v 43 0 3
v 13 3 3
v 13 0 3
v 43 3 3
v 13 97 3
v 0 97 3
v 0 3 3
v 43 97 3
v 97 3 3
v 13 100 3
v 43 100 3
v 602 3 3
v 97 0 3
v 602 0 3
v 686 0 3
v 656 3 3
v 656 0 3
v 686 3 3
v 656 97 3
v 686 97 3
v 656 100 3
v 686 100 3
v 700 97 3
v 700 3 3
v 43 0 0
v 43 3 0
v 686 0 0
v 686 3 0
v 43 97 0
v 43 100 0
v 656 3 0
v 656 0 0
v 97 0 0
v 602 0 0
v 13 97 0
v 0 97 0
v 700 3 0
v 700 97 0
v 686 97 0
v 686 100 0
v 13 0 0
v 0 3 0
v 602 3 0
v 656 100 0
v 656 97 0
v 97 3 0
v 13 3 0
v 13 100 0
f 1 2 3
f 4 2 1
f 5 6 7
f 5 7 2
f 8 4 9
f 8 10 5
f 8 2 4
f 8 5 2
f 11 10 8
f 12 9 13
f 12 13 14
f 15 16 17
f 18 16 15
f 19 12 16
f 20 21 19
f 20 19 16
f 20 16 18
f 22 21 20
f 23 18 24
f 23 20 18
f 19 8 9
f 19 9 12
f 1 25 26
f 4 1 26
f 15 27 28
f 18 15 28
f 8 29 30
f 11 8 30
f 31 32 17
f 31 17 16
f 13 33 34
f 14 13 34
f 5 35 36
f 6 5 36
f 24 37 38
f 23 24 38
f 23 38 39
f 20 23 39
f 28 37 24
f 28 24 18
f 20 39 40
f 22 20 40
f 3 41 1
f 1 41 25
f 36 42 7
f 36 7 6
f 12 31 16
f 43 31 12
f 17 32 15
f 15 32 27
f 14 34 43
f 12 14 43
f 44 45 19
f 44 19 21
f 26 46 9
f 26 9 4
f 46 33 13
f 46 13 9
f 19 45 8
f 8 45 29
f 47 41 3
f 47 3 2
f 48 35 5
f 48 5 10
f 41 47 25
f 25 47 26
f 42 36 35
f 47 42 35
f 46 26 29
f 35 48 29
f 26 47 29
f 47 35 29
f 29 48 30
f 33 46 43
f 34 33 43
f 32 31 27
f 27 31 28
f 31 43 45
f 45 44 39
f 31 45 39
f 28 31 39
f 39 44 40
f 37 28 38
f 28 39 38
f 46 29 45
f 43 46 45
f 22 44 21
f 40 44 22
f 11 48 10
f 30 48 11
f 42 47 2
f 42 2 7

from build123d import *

# Parameters (mm, degrees)
SKETCH1_W           = 700
SKETCH1_H           = 100
BOSS_EXTRUDE1_DEPTH = 3
SKETCH11_W          = 14
SKETCH11_H          = 3
CUT_EXTRUDE8_DEPTH  = 10
SKETCH12_W          = 54
SKETCH12_H          = 3
CUT_EXTRUDE9_DEPTH  = 10
SKETCH13_W          = 13
SKETCH13_H          = 3
CUT_EXTRUDE10_DEPTH = 10
SKETCH14_W          = 54
SKETCH14_H          = 3
CUT_EXTRUDE11_DEPTH = 10
SKETCH15_W          = 14
SKETCH15_H          = 3
CUT_EXTRUDE12_DEPTH = 10
SKETCH16_W          = 54
SKETCH16_H          = 3
CUT_EXTRUDE13_DEPTH = 10
SKETCH17_W          = 13
SKETCH17_H          = 3
CUT_EXTRUDE14_DEPTH = 10
SKETCH18_W          = 54
SKETCH18_H          = 3
CUT_EXTRUDE15_DEPTH = 10
SKETCH21_W          = 505
SKETCH21_H          = 3
CUT_EXTRUDE16_DEPTH = 3


with BuildPart() as part:
    # Sketch1 → Boss-Extrude1 (new body)
    with BuildSketch(Plane.XY):
        with Locations((350, 50)):
            Rectangle(SKETCH1_W, SKETCH1_H)
    extrude(amount=BOSS_EXTRUDE1_DEPTH)

    # Sketch11 → Cut-Extrude8 (cut)
    with BuildSketch(Plane(origin=(0, 0, 0), x_dir=(-1, 0, 0), z_dir=(0, 0, -1))):
        with Locations((-693, 1.5)):
            Rectangle(SKETCH11_W, SKETCH11_H)
    extrude(amount=-CUT_EXTRUDE8_DEPTH, mode=Mode.SUBTRACT)

    # Sketch12 → Cut-Extrude9 (cut)
    with BuildSketch(Plane(origin=(0, 0, 0), x_dir=(-1, 0, 0), z_dir=(0, 0, -1))):
        with Locations((-629, 1.5)):
            Rectangle(SKETCH12_W, SKETCH12_H)
    extrude(amount=-CUT_EXTRUDE9_DEPTH, mode=Mode.SUBTRACT)

    # Sketch13 → Cut-Extrude10 (cut)
    with BuildSketch(Plane(origin=(0, 0, 0), x_dir=(-1, 0, 0), z_dir=(0, 0, -1))):
        with Locations((-6.5, 1.5)):
            Rectangle(SKETCH13_W, SKETCH13_H)
    extrude(amount=-CUT_EXTRUDE10_DEPTH, mode=Mode.SUBTRACT)

    # Sketch14 → Cut-Extrude11 (cut)
    with BuildSketch(Plane(origin=(0, 0, 0), x_dir=(-1, 0, 0), z_dir=(0, 0, -1))):
        with Locations((-70, 1.5)):
            Rectangle(SKETCH14_W, SKETCH14_H)
    extrude(amount=-CUT_EXTRUDE11_DEPTH, mode=Mode.SUBTRACT)

    # Sketch15 → Cut-Extrude12 (cut)
    with BuildSketch(Plane(origin=(0, 0, 0), x_dir=(-1, 0, 0), z_dir=(0, 0, -1))):
        with Locations((-693, 98.5)):
            Rectangle(SKETCH15_W, SKETCH15_H)
    extrude(amount=-CUT_EXTRUDE12_DEPTH, mode=Mode.SUBTRACT)

    # Sketch16 → Cut-Extrude13 (cut)
    with BuildSketch(Plane(origin=(0, 0, 0), x_dir=(-1, 0, 0), z_dir=(0, 0, -1))):
        with Locations((-629, 98.5)):
            Rectangle(SKETCH16_W, SKETCH16_H)
    extrude(amount=-CUT_EXTRUDE13_DEPTH, mode=Mode.SUBTRACT)

    # Sketch17 → Cut-Extrude14 (cut)
    with BuildSketch(Plane(origin=(0, 0, 0), x_dir=(-1, 0, 0), z_dir=(0, 0, -1))):
        with Locations((-6.5, 98.5)):
            Rectangle(SKETCH17_W, SKETCH17_H)
    extrude(amount=-CUT_EXTRUDE14_DEPTH, mode=Mode.SUBTRACT)

    # Sketch18 → Cut-Extrude15 (cut)
    with BuildSketch(Plane(origin=(0, 0, 0), x_dir=(-1, 0, 0), z_dir=(0, 0, -1))):
        with Locations((-70, 98.5)):
            Rectangle(SKETCH18_W, SKETCH18_H)
    extrude(amount=-CUT_EXTRUDE15_DEPTH, mode=Mode.SUBTRACT)

    # Sketch21 → Cut-Extrude16 (cut)
    with BuildSketch(Plane.XY.offset(3)):
        with Locations((349.5, 98.5)):
            Rectangle(SKETCH21_W, SKETCH21_H)
    extrude(amount=-CUT_EXTRUDE16_DEPTH, mode=Mode.SUBTRACT)


solid = part.part
